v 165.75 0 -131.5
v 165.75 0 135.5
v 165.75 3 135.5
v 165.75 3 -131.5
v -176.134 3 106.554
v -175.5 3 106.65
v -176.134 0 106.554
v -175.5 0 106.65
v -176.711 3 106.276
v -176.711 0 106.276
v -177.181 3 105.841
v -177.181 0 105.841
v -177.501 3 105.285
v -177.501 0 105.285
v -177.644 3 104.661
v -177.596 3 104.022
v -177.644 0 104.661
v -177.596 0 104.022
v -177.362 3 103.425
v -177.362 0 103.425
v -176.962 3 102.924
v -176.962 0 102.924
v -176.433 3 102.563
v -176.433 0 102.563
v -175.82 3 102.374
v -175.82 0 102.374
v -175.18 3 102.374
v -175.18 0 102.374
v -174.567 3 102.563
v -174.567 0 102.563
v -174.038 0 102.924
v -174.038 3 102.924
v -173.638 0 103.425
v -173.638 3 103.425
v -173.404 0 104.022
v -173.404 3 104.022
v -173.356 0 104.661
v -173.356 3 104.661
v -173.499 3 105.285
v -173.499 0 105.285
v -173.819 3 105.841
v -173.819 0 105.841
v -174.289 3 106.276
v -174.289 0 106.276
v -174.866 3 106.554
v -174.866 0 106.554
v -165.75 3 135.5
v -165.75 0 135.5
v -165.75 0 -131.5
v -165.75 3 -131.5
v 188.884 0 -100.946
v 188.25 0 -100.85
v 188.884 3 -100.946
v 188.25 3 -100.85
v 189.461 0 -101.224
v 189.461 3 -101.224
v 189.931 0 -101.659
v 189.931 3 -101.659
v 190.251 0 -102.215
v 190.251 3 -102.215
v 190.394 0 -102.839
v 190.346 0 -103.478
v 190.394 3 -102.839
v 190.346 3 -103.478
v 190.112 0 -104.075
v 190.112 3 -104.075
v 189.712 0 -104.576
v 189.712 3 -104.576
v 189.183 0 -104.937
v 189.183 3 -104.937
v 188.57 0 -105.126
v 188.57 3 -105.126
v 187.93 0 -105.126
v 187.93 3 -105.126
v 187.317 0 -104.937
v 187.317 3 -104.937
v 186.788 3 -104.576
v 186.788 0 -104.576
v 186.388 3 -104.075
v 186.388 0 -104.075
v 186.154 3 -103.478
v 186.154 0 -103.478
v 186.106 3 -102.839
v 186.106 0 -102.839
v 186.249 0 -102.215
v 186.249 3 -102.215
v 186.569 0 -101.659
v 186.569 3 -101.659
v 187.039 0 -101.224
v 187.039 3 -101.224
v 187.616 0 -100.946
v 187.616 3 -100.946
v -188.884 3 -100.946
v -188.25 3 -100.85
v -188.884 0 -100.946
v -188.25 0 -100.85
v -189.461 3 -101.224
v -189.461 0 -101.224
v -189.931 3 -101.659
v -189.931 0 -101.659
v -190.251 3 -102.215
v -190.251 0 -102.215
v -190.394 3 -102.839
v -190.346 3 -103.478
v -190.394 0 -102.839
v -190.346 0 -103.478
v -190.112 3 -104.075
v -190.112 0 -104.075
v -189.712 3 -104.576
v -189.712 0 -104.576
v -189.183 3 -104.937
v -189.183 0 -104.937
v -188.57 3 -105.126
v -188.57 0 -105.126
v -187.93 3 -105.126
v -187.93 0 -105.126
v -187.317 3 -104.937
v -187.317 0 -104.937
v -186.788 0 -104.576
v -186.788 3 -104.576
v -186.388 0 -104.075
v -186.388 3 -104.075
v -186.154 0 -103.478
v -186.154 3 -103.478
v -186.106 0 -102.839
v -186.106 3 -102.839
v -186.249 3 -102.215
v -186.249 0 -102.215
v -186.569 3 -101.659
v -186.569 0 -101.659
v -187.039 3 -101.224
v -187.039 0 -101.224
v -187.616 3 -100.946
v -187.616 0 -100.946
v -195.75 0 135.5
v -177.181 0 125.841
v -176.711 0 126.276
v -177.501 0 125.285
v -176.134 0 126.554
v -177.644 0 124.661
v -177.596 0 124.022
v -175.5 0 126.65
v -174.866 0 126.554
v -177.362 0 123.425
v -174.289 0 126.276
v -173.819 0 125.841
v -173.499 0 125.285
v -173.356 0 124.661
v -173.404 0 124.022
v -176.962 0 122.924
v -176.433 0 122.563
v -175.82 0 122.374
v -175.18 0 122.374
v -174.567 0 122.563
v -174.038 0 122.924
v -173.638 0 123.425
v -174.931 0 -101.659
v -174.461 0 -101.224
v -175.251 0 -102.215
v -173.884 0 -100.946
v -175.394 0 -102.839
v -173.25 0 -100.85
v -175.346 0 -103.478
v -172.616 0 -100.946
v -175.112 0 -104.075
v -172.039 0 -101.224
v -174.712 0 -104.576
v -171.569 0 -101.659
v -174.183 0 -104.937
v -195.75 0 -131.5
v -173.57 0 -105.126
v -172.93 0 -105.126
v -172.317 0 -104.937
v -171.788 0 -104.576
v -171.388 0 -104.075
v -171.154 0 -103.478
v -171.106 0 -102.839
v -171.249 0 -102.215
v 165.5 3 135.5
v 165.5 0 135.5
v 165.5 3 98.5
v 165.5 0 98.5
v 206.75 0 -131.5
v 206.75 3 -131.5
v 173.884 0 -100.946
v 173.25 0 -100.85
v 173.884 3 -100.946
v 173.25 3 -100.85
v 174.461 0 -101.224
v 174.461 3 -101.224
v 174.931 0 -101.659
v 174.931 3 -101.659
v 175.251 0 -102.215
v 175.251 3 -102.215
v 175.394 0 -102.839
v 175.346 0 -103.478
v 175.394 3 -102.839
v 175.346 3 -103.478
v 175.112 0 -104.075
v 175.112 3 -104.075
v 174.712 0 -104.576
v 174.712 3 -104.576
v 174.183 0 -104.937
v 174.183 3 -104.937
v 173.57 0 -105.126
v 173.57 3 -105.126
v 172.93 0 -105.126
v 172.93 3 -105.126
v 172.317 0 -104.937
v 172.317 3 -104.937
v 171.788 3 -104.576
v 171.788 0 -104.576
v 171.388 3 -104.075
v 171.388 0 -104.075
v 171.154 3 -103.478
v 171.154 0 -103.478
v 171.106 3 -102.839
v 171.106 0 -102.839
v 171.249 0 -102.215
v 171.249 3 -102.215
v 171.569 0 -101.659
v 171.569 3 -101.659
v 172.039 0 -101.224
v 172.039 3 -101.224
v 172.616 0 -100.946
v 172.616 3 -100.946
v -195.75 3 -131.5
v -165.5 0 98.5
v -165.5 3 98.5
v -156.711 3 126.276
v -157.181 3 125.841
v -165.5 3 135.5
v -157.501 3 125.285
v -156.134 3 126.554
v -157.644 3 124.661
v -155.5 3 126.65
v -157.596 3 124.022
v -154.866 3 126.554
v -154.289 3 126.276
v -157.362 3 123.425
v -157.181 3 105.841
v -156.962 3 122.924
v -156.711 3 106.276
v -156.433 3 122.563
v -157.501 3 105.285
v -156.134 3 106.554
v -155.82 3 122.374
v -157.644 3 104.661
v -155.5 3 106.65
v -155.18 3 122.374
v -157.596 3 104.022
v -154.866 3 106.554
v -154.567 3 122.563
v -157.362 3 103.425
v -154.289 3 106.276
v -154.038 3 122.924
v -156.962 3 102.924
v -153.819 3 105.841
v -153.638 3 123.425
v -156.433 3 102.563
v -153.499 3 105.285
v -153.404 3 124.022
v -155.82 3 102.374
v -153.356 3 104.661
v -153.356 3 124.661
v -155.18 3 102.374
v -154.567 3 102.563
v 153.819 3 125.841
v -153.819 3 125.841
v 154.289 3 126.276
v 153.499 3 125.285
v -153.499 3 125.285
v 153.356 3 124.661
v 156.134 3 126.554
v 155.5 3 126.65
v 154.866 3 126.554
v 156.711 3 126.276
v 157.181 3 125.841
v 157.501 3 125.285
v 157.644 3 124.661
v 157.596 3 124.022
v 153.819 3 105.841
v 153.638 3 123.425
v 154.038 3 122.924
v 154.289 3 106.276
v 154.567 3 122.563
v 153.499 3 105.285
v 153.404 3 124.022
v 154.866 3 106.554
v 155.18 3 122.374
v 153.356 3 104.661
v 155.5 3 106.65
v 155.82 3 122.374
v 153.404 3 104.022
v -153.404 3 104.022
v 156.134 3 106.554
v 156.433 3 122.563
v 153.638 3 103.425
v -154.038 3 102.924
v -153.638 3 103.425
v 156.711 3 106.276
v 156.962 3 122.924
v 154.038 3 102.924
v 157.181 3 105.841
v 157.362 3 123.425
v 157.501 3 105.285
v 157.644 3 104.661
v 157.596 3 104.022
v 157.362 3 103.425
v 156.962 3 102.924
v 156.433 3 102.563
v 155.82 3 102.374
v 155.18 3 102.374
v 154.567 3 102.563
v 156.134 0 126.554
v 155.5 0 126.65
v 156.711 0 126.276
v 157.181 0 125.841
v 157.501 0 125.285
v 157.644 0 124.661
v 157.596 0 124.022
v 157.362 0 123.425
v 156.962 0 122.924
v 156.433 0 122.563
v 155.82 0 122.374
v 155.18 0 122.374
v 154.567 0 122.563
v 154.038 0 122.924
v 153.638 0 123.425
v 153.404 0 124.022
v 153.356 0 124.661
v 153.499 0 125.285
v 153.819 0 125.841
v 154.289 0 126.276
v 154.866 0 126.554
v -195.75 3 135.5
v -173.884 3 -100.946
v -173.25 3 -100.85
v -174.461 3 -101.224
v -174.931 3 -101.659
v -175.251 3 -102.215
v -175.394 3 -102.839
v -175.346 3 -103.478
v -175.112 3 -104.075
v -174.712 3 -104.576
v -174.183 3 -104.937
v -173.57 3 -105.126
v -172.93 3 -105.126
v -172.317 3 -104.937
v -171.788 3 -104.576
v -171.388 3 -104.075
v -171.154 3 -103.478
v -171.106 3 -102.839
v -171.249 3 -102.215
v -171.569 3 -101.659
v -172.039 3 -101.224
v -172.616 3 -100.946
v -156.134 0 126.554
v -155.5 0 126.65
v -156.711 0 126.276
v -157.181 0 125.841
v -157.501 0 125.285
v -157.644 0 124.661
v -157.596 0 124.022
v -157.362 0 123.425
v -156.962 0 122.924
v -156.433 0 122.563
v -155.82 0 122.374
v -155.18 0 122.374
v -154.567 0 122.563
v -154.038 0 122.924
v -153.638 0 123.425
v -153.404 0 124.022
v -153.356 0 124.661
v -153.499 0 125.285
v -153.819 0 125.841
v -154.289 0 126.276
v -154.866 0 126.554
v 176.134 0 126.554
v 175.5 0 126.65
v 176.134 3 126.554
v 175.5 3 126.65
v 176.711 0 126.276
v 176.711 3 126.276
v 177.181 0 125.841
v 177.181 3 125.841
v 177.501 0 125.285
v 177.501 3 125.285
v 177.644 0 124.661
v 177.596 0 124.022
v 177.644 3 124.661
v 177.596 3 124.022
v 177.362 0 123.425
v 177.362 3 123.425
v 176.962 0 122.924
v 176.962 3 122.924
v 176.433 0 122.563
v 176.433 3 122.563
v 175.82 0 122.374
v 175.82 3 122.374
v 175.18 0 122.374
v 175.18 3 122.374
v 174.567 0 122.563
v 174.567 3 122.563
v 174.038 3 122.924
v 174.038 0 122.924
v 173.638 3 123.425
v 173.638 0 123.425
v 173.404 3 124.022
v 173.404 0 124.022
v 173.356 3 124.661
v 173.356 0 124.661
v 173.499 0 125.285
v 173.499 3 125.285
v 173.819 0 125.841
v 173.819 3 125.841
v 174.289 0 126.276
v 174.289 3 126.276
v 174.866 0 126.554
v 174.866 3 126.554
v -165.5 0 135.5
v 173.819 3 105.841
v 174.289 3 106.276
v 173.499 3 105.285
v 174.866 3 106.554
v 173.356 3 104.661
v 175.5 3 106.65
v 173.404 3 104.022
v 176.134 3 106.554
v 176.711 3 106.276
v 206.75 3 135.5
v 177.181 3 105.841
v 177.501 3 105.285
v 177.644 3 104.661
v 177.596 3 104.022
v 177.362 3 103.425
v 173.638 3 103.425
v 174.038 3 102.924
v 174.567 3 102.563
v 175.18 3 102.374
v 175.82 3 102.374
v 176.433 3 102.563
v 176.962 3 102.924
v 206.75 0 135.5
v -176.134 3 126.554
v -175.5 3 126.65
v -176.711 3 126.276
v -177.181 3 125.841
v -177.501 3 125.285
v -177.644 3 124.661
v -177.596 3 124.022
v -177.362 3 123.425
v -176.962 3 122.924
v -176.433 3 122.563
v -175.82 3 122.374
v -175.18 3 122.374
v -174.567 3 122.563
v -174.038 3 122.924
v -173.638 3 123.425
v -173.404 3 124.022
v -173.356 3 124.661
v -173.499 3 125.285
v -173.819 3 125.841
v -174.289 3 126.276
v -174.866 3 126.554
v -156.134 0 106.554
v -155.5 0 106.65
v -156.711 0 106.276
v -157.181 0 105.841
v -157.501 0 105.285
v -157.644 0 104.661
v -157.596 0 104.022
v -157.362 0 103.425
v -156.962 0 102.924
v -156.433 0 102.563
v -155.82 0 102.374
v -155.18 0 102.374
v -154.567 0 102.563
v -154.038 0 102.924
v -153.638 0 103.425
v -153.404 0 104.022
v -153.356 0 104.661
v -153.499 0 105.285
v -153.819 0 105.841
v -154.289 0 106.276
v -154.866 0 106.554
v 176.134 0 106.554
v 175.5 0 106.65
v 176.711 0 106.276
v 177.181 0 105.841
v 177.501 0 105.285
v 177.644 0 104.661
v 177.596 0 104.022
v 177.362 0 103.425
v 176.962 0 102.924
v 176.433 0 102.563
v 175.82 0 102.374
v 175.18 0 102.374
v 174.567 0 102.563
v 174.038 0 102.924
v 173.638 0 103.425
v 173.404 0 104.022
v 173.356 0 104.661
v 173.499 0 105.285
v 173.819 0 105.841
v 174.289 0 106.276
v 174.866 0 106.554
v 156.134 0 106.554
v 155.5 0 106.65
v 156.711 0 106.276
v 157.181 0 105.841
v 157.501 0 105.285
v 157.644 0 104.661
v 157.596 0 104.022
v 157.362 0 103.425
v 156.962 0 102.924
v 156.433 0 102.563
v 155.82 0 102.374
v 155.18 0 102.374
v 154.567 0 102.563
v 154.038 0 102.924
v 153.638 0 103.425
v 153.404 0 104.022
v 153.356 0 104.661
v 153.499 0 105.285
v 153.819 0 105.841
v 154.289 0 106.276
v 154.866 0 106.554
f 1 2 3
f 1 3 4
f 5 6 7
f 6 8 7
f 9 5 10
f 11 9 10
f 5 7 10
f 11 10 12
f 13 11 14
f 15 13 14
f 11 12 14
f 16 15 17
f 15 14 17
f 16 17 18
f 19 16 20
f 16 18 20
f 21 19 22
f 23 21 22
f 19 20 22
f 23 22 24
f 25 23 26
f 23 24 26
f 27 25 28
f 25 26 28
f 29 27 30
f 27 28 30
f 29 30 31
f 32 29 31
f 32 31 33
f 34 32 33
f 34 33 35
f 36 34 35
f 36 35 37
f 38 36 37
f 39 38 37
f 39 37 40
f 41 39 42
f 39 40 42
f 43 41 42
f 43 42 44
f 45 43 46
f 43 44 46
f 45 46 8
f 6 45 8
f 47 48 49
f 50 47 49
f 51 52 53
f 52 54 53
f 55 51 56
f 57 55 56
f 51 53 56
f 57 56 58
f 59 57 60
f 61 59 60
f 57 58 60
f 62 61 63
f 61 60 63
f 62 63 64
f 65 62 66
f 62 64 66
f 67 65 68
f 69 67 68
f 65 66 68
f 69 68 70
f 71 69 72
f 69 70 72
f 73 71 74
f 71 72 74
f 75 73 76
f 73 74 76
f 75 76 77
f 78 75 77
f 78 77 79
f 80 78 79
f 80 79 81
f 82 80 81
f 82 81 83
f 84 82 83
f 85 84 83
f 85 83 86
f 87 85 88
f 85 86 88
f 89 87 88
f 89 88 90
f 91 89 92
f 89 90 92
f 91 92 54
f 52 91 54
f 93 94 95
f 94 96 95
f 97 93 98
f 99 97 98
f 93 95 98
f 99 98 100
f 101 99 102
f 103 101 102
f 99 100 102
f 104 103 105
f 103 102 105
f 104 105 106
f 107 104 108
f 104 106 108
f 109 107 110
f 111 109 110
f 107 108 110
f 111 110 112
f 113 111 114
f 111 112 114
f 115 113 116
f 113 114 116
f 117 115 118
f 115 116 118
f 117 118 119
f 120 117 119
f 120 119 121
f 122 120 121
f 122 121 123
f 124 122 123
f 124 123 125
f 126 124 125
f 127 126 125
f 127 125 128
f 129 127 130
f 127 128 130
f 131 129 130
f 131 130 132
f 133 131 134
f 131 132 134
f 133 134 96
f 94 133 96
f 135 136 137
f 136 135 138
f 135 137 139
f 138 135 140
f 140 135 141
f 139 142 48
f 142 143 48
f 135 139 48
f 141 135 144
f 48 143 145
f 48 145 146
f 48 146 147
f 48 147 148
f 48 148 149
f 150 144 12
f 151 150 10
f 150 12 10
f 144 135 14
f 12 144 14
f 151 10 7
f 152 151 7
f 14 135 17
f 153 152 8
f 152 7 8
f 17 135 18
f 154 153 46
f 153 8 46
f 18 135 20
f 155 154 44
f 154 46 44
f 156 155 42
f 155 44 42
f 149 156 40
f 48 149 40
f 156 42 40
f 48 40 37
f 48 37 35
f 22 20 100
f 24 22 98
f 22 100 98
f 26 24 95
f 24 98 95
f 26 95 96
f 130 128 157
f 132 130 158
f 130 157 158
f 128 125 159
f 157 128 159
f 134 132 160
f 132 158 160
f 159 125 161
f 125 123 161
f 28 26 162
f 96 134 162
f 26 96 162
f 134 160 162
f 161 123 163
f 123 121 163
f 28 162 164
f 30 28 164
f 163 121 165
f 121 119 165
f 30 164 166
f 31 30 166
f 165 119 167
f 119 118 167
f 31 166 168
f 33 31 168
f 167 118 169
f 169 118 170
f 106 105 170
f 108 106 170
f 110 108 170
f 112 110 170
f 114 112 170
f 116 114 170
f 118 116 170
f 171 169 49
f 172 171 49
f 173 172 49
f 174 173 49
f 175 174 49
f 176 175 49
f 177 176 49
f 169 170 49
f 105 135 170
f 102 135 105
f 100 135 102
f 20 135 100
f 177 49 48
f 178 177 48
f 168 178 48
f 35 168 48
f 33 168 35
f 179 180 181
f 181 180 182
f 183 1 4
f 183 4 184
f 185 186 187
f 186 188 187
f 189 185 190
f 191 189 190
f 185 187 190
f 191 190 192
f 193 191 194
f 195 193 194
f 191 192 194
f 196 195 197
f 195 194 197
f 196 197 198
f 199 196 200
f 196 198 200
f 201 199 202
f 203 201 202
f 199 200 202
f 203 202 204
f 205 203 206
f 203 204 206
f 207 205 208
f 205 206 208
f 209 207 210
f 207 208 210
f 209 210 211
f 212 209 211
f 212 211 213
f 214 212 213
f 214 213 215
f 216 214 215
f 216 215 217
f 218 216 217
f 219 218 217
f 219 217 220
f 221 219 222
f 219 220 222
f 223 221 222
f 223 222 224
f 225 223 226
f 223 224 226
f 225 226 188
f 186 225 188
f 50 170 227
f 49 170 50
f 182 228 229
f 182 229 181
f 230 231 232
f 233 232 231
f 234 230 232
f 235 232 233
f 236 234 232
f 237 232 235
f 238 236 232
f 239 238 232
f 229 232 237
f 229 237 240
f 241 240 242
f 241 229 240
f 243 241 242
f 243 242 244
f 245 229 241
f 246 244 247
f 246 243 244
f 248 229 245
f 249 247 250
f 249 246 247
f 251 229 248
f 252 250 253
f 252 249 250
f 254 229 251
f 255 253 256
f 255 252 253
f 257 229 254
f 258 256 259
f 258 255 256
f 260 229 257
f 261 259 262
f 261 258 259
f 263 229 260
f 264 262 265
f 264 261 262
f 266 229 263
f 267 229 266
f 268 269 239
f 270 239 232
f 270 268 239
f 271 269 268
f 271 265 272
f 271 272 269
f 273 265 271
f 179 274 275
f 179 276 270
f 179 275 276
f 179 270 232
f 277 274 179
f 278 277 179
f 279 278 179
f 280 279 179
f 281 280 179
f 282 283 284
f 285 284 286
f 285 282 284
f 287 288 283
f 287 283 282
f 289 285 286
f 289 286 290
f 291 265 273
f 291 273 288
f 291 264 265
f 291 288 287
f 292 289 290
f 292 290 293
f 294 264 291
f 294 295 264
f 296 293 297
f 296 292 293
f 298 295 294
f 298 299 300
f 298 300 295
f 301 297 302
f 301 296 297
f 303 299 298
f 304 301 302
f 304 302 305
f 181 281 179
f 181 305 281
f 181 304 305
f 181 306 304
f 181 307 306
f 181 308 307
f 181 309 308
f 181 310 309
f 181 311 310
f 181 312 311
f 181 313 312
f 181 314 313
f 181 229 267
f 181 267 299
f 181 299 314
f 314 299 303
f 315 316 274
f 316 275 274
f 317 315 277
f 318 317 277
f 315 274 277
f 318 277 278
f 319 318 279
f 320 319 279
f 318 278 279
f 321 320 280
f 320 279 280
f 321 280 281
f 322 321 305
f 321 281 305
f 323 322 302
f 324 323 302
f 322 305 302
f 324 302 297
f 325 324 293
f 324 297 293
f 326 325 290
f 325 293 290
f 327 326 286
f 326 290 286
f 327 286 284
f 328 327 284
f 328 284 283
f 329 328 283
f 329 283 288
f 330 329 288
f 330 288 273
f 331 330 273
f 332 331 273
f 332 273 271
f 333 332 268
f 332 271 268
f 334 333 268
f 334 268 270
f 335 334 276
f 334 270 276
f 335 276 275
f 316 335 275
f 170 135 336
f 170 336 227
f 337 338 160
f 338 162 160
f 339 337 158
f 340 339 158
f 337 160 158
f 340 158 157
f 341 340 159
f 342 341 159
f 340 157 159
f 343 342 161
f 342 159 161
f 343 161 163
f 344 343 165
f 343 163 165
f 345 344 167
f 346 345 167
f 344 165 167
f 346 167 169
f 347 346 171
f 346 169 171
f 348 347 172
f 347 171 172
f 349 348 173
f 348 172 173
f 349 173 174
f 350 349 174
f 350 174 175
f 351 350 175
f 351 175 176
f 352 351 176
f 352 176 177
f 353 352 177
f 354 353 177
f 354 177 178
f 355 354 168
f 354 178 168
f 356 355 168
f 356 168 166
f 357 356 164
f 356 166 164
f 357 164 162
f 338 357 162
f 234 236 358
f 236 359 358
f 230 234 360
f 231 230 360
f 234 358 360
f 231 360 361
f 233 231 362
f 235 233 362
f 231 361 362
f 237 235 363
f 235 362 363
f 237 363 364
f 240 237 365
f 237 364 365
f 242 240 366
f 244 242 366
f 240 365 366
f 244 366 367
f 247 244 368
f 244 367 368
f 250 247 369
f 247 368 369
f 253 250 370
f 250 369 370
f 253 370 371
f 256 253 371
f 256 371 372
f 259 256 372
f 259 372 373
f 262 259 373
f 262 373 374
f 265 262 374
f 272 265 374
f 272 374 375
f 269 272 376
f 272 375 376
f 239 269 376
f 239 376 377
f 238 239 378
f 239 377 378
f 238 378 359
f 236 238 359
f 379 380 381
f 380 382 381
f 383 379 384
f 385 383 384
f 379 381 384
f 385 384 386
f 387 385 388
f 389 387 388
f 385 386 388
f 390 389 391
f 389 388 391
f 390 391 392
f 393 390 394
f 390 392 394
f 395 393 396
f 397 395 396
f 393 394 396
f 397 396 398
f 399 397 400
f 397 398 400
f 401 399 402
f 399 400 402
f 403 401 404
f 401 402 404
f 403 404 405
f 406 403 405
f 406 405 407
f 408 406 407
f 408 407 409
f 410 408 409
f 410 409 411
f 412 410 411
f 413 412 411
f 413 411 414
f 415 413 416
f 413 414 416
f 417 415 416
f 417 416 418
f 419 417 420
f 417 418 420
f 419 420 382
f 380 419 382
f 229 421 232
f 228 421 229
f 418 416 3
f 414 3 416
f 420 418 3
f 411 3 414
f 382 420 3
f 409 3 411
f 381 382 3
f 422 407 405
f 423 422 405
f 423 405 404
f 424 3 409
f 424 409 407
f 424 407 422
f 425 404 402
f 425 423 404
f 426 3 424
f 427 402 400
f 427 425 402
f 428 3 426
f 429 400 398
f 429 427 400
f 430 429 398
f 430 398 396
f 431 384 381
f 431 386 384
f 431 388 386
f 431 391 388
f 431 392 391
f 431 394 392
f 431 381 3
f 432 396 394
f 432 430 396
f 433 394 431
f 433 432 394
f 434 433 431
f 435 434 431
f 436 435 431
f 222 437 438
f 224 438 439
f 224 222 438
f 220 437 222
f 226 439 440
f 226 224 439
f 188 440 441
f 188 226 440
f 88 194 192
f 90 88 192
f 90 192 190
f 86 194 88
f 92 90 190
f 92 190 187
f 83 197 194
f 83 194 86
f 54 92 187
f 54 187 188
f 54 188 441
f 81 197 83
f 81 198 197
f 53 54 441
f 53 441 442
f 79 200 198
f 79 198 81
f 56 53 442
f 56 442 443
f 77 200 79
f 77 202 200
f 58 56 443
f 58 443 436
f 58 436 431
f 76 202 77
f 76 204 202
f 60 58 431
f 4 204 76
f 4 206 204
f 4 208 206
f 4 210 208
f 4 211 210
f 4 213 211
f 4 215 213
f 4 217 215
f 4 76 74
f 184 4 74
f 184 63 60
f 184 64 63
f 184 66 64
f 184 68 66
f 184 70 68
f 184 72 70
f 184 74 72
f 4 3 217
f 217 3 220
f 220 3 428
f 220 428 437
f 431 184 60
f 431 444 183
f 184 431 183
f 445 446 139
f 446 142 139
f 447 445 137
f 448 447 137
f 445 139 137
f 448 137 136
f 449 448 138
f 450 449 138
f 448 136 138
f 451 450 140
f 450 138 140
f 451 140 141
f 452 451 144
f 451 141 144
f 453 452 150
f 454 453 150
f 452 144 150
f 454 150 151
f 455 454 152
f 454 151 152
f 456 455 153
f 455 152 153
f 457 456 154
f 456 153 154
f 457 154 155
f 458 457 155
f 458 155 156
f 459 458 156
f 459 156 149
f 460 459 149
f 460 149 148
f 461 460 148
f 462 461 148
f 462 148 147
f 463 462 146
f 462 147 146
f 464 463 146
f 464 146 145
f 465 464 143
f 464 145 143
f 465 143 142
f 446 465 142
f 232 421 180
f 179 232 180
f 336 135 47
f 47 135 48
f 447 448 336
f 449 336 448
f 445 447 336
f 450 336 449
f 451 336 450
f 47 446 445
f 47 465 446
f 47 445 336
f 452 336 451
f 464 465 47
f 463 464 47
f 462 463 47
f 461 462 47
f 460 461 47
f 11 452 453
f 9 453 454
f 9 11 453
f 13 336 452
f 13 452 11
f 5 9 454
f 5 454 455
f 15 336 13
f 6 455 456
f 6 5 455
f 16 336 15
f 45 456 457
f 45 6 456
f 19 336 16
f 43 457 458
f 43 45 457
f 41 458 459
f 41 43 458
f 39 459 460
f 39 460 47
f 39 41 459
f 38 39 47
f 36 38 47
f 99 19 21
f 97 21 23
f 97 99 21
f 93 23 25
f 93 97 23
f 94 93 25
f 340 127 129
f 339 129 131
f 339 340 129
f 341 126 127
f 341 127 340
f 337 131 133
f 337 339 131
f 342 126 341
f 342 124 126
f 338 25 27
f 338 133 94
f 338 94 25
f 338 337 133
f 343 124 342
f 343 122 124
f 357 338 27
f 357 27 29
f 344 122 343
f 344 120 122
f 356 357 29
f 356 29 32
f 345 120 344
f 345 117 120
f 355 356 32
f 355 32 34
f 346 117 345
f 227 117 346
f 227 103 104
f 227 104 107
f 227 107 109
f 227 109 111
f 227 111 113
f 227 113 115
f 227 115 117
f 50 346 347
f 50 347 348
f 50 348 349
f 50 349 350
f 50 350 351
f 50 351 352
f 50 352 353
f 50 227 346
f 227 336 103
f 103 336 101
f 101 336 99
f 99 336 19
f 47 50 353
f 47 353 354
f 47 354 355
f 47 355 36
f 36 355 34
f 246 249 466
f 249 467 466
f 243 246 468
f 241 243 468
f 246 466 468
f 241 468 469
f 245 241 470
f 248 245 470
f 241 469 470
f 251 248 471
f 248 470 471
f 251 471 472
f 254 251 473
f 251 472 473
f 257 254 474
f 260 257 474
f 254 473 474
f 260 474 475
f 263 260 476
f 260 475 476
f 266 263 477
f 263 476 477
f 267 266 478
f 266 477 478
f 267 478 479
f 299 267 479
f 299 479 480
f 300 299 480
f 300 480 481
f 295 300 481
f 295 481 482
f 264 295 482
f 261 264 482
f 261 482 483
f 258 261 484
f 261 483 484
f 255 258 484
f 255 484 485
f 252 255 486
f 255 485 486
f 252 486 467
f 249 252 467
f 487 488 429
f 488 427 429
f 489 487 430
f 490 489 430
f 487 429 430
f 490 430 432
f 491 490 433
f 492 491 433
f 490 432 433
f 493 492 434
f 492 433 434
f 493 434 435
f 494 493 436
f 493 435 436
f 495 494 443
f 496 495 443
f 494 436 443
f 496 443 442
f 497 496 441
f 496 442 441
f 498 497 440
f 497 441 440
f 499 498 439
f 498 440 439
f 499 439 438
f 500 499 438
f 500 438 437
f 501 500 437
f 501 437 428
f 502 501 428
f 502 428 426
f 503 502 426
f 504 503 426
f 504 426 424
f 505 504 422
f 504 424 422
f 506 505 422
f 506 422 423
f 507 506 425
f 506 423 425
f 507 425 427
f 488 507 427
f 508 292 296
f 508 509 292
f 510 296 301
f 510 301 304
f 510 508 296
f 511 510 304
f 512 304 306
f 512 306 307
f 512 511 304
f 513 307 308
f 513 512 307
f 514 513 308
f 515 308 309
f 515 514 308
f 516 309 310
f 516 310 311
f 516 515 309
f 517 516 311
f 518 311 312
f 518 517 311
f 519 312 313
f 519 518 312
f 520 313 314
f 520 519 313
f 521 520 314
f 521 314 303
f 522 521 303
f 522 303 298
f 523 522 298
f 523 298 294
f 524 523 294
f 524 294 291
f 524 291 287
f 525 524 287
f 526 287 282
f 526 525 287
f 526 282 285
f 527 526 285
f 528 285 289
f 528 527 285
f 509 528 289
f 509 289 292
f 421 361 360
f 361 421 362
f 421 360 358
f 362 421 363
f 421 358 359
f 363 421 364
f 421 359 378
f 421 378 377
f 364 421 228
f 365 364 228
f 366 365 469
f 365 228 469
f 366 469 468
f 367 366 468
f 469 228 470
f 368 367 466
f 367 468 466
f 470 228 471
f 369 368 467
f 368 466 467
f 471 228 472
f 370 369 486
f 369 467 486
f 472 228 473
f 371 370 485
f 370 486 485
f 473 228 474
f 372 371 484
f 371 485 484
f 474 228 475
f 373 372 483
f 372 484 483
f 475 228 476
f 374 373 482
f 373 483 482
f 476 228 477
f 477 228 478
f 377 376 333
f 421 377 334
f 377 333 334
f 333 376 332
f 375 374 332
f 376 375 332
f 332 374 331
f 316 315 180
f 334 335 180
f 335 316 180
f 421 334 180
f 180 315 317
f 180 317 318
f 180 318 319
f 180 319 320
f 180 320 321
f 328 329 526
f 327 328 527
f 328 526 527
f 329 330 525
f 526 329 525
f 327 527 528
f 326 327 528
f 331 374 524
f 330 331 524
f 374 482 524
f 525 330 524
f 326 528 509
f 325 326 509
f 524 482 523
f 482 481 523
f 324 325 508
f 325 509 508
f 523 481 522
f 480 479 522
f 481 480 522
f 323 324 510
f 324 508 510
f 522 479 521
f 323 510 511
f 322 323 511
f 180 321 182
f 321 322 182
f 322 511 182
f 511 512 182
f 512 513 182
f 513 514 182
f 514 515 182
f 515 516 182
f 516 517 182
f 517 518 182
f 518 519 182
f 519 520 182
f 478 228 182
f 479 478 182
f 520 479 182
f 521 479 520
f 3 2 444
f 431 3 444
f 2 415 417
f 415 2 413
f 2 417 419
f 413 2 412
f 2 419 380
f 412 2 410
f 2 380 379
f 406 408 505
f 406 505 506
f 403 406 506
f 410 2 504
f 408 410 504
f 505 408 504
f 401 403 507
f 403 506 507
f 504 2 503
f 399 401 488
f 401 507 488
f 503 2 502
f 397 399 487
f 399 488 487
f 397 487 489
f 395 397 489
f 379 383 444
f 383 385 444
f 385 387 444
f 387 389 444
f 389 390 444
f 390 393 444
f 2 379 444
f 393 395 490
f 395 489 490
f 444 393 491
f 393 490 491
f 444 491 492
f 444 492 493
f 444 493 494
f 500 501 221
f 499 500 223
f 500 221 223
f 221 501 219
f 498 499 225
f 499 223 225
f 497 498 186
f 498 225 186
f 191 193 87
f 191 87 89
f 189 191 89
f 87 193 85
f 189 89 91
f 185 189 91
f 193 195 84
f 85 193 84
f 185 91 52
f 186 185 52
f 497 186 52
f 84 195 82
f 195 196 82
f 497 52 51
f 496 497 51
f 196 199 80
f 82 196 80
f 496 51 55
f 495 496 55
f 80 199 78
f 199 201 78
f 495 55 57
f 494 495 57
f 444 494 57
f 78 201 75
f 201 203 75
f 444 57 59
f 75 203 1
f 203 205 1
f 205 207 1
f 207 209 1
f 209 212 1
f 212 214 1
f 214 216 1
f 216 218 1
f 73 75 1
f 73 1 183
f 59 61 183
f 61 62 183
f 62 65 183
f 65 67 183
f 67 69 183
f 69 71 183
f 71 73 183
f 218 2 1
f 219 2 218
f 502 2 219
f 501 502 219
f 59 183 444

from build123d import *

# Parameters (mm, degrees)
SKETCH1_W                     = 41
SKETCH1_H                     = 267
BOSS_EXTRUDE1_DEPTH           = 3
SKETCH2_W                     = 30
SKETCH2_H                     = 267
BOSS_EXTRUDE2_DEPTH           = 3
SKETCH3_W                     = 331
SKETCH3_H                     = 37
BOSS_EXTRUDE3_DEPTH           = 3
SKETCH6_W                     = 2.15
SKETCH6_H                     = 3
M4_CLEARANCE_HOLE1_AT_2_COUNT = 2
M4_CLEARANCE_HOLE1_AT_2_PITCH = 28.284271247
M4_CLEARANCE_HOLE1_AT_3_COUNT = 2
M4_CLEARANCE_HOLE1_AT_3_PITCH = 20
M4_CLEARANCE_HOLE1_AT_4_COUNT = 2
M4_CLEARANCE_HOLE1_AT_4_PITCH = 20
M4_CLEARANCE_HOLE1_AT_5_COUNT = 2
M4_CLEARANCE_HOLE1_AT_5_PITCH = 210.068589989
M4_CLEARANCE_HOLE1_AT_6_COUNT = 2
M4_CLEARANCE_HOLE1_AT_6_PITCH = 208.257802975
MIRROR1_COPY_1_SKETCH_W       = 2.15
MIRROR1_COPY_1_SKETCH_H       = 3
MIRROR1_COPY_2_SKETCH_W       = 2.15
MIRROR1_COPY_2_SKETCH_H       = 3
MIRROR1_COPY_3_SKETCH_W       = 2.15
MIRROR1_COPY_3_SKETCH_H       = 3
MIRROR1_COPY_4_SKETCH_W       = 2.15
MIRROR1_COPY_4_SKETCH_H       = 3
MIRROR1_COPY_5_SKETCH_W       = 2.15
MIRROR1_COPY_5_SKETCH_H       = 3


with BuildPart() as part:
    # Sketch1 → Boss-Extrude1 (new body)
    with BuildSketch(Plane(origin=(0, 0, 0), x_dir=(1, 0, 0), z_dir=(0, 1, 0))):
        with Locations((186.25, -2)):
            Rectangle(SKETCH1_W, SKETCH1_H)
    extrude(amount=BOSS_EXTRUDE1_DEPTH)

    # Mirror1 copy 1 sketch → Mirror1 copy 1 (revolve, cut)
    with BuildSketch(Plane(origin=(175.5, 3, 124.5), x_dir=(0, 0, 1), z_dir=(-1, 0, 0))):
        with Locations((1.075, -1.5)):
            Rectangle(MIRROR1_COPY_1_SKETCH_W, MIRROR1_COPY_1_SKETCH_H)
    revolve(axis=Axis((175.5, 9.35, 124.5), (0, 1, 0)), mode=Mode.SUBTRACT)

    # Mirror1 copy 2 sketch → Mirror1 copy 2 (revolve, cut)
    with BuildSketch(Plane(origin=(175.5, 3, 104.5), x_dir=(0, 0, 1), z_dir=(-1, 0, 0))):
        with Locations((1.075, -1.5)):
            Rectangle(MIRROR1_COPY_2_SKETCH_W, MIRROR1_COPY_2_SKETCH_H)
    revolve(axis=Axis((175.5, 9.35, 104.5), (0, 1, 0)), mode=Mode.SUBTRACT)

    # Mirror1 copy 4 sketch → Mirror1 copy 4 (revolve, cut)
    with BuildSketch(Plane(origin=(188.25, 3, -103), x_dir=(0, 0, 1), z_dir=(-1, 0, 0))):
        with Locations((1.075, -1.5)):
            Rectangle(MIRROR1_COPY_4_SKETCH_W, MIRROR1_COPY_4_SKETCH_H)
    revolve(axis=Axis((188.25, 9.35, -103), (0, 1, 0)), mode=Mode.SUBTRACT)

    # Mirror1 copy 5 sketch → Mirror1 copy 5 (revolve, cut)
    with BuildSketch(Plane(origin=(173.25, 3, -103), x_dir=(0, 0, 1), z_dir=(-1, 0, 0))):
        with Locations((1.075, -1.5)):
            Rectangle(MIRROR1_COPY_5_SKETCH_W, MIRROR1_COPY_5_SKETCH_H)
    revolve(axis=Axis((173.25, 9.35, -103), (0, 1, 0)), mode=Mode.SUBTRACT)


with BuildPart() as body_2:
    # Sketch2 → Boss-Extrude2 (new body)
    with BuildSketch(Plane(origin=(0, 0, 0), x_dir=(1, 0, 0), z_dir=(0, 1, 0))):
        with Locations((-180.75, -2)):
            Rectangle(SKETCH2_W, SKETCH2_H)
    extrude(amount=BOSS_EXTRUDE2_DEPTH)


with BuildPart() as body_3:
    # Sketch3 → Boss-Extrude3 (new body)
    with BuildSketch(Plane(origin=(0, 0, 0), x_dir=(1, 0, 0), z_dir=(0, 1, 0))):
        with Locations((0, -117)):
            Rectangle(SKETCH3_W, SKETCH3_H)
    extrude(amount=BOSS_EXTRUDE3_DEPTH)

    # Sketch6 → M4 Clearance Hole1 (revolve, cut)
    with BuildSketch(Plane(origin=(-155.5, 3, 104.5), x_dir=(0, 0, 1), z_dir=(1, 0, 0))):
        with Locations((1.075, 1.5)):
            Rectangle(SKETCH6_W, SKETCH6_H)
    m4_clearance_hole1 = revolve(axis=Axis((-155.5, 9.35, 104.5), (0, -1, 0)), mode=Mode.SUBTRACT)

    # M4 Clearance Hole1 at 4: M4 Clearance Hole1 ×2
    with Locations(*[(0, 0, i * M4_CLEARANCE_HOLE1_AT_4_PITCH) for i in range(1, M4_CLEARANCE_HOLE1_AT_4_COUNT)]):
        add(m4_clearance_hole1, mode=Mode.SUBTRACT)

    # Mirror1: M4 Clearance Hole1 across plane
    add(m4_clearance_hole1.mirror(Plane(origin=(0, 0, 0), x_dir=(0, 0, 1), z_dir=(1, 0, 0))), mode=Mode.SUBTRACT)

    # Mirror1 copy 3 sketch → Mirror1 copy 3 (revolve, cut)
    with BuildSketch(Plane(origin=(155.5, 3, 124.5), x_dir=(0, 0, 1), z_dir=(-1, 0, 0))):
        with Locations((1.075, -1.5)):
            Rectangle(MIRROR1_COPY_3_SKETCH_W, MIRROR1_COPY_3_SKETCH_H)
    revolve(axis=Axis((155.5, 9.35, 124.5), (0, 1, 0)), mode=Mode.SUBTRACT)


with BuildPart() as body_2_1:
    add(body_2.part)

    # M4 Clearance Hole1 at 2: M4 Clearance Hole1 ×2
    with Locations(*[Vector(-0.7071067811865478, 0, 0.7071067811865472) * (i * M4_CLEARANCE_HOLE1_AT_2_PITCH) for i in range(1, M4_CLEARANCE_HOLE1_AT_2_COUNT)]):
        add(m4_clearance_hole1, mode=Mode.SUBTRACT)

    # M4 Clearance Hole1 at 3: M4 Clearance Hole1 ×2
    with Locations(*[(-i * M4_CLEARANCE_HOLE1_AT_3_PITCH, 0, 0) for i in range(1, M4_CLEARANCE_HOLE1_AT_3_COUNT)]):
        add(m4_clearance_hole1, mode=Mode.SUBTRACT)

    # M4 Clearance Hole1 at 5: M4 Clearance Hole1 ×2
    with Locations(*[Vector(-0.15590146057391321, 0, -0.9877726127965487) * (i * M4_CLEARANCE_HOLE1_AT_5_PITCH) for i in range(1, M4_CLEARANCE_HOLE1_AT_5_COUNT)]):
        add(m4_clearance_hole1, mode=Mode.SUBTRACT)

    # M4 Clearance Hole1 at 6: M4 Clearance Hole1 ×2
    with Locations(*[Vector(-0.08523090009801677, 0, -0.9963612264979413) * (i * M4_CLEARANCE_HOLE1_AT_6_PITCH) for i in range(1, M4_CLEARANCE_HOLE1_AT_6_COUNT)]):
        add(m4_clearance_hole1, mode=Mode.SUBTRACT)


solid = Compound([part.part, body_3.part, body_2_1.part])
